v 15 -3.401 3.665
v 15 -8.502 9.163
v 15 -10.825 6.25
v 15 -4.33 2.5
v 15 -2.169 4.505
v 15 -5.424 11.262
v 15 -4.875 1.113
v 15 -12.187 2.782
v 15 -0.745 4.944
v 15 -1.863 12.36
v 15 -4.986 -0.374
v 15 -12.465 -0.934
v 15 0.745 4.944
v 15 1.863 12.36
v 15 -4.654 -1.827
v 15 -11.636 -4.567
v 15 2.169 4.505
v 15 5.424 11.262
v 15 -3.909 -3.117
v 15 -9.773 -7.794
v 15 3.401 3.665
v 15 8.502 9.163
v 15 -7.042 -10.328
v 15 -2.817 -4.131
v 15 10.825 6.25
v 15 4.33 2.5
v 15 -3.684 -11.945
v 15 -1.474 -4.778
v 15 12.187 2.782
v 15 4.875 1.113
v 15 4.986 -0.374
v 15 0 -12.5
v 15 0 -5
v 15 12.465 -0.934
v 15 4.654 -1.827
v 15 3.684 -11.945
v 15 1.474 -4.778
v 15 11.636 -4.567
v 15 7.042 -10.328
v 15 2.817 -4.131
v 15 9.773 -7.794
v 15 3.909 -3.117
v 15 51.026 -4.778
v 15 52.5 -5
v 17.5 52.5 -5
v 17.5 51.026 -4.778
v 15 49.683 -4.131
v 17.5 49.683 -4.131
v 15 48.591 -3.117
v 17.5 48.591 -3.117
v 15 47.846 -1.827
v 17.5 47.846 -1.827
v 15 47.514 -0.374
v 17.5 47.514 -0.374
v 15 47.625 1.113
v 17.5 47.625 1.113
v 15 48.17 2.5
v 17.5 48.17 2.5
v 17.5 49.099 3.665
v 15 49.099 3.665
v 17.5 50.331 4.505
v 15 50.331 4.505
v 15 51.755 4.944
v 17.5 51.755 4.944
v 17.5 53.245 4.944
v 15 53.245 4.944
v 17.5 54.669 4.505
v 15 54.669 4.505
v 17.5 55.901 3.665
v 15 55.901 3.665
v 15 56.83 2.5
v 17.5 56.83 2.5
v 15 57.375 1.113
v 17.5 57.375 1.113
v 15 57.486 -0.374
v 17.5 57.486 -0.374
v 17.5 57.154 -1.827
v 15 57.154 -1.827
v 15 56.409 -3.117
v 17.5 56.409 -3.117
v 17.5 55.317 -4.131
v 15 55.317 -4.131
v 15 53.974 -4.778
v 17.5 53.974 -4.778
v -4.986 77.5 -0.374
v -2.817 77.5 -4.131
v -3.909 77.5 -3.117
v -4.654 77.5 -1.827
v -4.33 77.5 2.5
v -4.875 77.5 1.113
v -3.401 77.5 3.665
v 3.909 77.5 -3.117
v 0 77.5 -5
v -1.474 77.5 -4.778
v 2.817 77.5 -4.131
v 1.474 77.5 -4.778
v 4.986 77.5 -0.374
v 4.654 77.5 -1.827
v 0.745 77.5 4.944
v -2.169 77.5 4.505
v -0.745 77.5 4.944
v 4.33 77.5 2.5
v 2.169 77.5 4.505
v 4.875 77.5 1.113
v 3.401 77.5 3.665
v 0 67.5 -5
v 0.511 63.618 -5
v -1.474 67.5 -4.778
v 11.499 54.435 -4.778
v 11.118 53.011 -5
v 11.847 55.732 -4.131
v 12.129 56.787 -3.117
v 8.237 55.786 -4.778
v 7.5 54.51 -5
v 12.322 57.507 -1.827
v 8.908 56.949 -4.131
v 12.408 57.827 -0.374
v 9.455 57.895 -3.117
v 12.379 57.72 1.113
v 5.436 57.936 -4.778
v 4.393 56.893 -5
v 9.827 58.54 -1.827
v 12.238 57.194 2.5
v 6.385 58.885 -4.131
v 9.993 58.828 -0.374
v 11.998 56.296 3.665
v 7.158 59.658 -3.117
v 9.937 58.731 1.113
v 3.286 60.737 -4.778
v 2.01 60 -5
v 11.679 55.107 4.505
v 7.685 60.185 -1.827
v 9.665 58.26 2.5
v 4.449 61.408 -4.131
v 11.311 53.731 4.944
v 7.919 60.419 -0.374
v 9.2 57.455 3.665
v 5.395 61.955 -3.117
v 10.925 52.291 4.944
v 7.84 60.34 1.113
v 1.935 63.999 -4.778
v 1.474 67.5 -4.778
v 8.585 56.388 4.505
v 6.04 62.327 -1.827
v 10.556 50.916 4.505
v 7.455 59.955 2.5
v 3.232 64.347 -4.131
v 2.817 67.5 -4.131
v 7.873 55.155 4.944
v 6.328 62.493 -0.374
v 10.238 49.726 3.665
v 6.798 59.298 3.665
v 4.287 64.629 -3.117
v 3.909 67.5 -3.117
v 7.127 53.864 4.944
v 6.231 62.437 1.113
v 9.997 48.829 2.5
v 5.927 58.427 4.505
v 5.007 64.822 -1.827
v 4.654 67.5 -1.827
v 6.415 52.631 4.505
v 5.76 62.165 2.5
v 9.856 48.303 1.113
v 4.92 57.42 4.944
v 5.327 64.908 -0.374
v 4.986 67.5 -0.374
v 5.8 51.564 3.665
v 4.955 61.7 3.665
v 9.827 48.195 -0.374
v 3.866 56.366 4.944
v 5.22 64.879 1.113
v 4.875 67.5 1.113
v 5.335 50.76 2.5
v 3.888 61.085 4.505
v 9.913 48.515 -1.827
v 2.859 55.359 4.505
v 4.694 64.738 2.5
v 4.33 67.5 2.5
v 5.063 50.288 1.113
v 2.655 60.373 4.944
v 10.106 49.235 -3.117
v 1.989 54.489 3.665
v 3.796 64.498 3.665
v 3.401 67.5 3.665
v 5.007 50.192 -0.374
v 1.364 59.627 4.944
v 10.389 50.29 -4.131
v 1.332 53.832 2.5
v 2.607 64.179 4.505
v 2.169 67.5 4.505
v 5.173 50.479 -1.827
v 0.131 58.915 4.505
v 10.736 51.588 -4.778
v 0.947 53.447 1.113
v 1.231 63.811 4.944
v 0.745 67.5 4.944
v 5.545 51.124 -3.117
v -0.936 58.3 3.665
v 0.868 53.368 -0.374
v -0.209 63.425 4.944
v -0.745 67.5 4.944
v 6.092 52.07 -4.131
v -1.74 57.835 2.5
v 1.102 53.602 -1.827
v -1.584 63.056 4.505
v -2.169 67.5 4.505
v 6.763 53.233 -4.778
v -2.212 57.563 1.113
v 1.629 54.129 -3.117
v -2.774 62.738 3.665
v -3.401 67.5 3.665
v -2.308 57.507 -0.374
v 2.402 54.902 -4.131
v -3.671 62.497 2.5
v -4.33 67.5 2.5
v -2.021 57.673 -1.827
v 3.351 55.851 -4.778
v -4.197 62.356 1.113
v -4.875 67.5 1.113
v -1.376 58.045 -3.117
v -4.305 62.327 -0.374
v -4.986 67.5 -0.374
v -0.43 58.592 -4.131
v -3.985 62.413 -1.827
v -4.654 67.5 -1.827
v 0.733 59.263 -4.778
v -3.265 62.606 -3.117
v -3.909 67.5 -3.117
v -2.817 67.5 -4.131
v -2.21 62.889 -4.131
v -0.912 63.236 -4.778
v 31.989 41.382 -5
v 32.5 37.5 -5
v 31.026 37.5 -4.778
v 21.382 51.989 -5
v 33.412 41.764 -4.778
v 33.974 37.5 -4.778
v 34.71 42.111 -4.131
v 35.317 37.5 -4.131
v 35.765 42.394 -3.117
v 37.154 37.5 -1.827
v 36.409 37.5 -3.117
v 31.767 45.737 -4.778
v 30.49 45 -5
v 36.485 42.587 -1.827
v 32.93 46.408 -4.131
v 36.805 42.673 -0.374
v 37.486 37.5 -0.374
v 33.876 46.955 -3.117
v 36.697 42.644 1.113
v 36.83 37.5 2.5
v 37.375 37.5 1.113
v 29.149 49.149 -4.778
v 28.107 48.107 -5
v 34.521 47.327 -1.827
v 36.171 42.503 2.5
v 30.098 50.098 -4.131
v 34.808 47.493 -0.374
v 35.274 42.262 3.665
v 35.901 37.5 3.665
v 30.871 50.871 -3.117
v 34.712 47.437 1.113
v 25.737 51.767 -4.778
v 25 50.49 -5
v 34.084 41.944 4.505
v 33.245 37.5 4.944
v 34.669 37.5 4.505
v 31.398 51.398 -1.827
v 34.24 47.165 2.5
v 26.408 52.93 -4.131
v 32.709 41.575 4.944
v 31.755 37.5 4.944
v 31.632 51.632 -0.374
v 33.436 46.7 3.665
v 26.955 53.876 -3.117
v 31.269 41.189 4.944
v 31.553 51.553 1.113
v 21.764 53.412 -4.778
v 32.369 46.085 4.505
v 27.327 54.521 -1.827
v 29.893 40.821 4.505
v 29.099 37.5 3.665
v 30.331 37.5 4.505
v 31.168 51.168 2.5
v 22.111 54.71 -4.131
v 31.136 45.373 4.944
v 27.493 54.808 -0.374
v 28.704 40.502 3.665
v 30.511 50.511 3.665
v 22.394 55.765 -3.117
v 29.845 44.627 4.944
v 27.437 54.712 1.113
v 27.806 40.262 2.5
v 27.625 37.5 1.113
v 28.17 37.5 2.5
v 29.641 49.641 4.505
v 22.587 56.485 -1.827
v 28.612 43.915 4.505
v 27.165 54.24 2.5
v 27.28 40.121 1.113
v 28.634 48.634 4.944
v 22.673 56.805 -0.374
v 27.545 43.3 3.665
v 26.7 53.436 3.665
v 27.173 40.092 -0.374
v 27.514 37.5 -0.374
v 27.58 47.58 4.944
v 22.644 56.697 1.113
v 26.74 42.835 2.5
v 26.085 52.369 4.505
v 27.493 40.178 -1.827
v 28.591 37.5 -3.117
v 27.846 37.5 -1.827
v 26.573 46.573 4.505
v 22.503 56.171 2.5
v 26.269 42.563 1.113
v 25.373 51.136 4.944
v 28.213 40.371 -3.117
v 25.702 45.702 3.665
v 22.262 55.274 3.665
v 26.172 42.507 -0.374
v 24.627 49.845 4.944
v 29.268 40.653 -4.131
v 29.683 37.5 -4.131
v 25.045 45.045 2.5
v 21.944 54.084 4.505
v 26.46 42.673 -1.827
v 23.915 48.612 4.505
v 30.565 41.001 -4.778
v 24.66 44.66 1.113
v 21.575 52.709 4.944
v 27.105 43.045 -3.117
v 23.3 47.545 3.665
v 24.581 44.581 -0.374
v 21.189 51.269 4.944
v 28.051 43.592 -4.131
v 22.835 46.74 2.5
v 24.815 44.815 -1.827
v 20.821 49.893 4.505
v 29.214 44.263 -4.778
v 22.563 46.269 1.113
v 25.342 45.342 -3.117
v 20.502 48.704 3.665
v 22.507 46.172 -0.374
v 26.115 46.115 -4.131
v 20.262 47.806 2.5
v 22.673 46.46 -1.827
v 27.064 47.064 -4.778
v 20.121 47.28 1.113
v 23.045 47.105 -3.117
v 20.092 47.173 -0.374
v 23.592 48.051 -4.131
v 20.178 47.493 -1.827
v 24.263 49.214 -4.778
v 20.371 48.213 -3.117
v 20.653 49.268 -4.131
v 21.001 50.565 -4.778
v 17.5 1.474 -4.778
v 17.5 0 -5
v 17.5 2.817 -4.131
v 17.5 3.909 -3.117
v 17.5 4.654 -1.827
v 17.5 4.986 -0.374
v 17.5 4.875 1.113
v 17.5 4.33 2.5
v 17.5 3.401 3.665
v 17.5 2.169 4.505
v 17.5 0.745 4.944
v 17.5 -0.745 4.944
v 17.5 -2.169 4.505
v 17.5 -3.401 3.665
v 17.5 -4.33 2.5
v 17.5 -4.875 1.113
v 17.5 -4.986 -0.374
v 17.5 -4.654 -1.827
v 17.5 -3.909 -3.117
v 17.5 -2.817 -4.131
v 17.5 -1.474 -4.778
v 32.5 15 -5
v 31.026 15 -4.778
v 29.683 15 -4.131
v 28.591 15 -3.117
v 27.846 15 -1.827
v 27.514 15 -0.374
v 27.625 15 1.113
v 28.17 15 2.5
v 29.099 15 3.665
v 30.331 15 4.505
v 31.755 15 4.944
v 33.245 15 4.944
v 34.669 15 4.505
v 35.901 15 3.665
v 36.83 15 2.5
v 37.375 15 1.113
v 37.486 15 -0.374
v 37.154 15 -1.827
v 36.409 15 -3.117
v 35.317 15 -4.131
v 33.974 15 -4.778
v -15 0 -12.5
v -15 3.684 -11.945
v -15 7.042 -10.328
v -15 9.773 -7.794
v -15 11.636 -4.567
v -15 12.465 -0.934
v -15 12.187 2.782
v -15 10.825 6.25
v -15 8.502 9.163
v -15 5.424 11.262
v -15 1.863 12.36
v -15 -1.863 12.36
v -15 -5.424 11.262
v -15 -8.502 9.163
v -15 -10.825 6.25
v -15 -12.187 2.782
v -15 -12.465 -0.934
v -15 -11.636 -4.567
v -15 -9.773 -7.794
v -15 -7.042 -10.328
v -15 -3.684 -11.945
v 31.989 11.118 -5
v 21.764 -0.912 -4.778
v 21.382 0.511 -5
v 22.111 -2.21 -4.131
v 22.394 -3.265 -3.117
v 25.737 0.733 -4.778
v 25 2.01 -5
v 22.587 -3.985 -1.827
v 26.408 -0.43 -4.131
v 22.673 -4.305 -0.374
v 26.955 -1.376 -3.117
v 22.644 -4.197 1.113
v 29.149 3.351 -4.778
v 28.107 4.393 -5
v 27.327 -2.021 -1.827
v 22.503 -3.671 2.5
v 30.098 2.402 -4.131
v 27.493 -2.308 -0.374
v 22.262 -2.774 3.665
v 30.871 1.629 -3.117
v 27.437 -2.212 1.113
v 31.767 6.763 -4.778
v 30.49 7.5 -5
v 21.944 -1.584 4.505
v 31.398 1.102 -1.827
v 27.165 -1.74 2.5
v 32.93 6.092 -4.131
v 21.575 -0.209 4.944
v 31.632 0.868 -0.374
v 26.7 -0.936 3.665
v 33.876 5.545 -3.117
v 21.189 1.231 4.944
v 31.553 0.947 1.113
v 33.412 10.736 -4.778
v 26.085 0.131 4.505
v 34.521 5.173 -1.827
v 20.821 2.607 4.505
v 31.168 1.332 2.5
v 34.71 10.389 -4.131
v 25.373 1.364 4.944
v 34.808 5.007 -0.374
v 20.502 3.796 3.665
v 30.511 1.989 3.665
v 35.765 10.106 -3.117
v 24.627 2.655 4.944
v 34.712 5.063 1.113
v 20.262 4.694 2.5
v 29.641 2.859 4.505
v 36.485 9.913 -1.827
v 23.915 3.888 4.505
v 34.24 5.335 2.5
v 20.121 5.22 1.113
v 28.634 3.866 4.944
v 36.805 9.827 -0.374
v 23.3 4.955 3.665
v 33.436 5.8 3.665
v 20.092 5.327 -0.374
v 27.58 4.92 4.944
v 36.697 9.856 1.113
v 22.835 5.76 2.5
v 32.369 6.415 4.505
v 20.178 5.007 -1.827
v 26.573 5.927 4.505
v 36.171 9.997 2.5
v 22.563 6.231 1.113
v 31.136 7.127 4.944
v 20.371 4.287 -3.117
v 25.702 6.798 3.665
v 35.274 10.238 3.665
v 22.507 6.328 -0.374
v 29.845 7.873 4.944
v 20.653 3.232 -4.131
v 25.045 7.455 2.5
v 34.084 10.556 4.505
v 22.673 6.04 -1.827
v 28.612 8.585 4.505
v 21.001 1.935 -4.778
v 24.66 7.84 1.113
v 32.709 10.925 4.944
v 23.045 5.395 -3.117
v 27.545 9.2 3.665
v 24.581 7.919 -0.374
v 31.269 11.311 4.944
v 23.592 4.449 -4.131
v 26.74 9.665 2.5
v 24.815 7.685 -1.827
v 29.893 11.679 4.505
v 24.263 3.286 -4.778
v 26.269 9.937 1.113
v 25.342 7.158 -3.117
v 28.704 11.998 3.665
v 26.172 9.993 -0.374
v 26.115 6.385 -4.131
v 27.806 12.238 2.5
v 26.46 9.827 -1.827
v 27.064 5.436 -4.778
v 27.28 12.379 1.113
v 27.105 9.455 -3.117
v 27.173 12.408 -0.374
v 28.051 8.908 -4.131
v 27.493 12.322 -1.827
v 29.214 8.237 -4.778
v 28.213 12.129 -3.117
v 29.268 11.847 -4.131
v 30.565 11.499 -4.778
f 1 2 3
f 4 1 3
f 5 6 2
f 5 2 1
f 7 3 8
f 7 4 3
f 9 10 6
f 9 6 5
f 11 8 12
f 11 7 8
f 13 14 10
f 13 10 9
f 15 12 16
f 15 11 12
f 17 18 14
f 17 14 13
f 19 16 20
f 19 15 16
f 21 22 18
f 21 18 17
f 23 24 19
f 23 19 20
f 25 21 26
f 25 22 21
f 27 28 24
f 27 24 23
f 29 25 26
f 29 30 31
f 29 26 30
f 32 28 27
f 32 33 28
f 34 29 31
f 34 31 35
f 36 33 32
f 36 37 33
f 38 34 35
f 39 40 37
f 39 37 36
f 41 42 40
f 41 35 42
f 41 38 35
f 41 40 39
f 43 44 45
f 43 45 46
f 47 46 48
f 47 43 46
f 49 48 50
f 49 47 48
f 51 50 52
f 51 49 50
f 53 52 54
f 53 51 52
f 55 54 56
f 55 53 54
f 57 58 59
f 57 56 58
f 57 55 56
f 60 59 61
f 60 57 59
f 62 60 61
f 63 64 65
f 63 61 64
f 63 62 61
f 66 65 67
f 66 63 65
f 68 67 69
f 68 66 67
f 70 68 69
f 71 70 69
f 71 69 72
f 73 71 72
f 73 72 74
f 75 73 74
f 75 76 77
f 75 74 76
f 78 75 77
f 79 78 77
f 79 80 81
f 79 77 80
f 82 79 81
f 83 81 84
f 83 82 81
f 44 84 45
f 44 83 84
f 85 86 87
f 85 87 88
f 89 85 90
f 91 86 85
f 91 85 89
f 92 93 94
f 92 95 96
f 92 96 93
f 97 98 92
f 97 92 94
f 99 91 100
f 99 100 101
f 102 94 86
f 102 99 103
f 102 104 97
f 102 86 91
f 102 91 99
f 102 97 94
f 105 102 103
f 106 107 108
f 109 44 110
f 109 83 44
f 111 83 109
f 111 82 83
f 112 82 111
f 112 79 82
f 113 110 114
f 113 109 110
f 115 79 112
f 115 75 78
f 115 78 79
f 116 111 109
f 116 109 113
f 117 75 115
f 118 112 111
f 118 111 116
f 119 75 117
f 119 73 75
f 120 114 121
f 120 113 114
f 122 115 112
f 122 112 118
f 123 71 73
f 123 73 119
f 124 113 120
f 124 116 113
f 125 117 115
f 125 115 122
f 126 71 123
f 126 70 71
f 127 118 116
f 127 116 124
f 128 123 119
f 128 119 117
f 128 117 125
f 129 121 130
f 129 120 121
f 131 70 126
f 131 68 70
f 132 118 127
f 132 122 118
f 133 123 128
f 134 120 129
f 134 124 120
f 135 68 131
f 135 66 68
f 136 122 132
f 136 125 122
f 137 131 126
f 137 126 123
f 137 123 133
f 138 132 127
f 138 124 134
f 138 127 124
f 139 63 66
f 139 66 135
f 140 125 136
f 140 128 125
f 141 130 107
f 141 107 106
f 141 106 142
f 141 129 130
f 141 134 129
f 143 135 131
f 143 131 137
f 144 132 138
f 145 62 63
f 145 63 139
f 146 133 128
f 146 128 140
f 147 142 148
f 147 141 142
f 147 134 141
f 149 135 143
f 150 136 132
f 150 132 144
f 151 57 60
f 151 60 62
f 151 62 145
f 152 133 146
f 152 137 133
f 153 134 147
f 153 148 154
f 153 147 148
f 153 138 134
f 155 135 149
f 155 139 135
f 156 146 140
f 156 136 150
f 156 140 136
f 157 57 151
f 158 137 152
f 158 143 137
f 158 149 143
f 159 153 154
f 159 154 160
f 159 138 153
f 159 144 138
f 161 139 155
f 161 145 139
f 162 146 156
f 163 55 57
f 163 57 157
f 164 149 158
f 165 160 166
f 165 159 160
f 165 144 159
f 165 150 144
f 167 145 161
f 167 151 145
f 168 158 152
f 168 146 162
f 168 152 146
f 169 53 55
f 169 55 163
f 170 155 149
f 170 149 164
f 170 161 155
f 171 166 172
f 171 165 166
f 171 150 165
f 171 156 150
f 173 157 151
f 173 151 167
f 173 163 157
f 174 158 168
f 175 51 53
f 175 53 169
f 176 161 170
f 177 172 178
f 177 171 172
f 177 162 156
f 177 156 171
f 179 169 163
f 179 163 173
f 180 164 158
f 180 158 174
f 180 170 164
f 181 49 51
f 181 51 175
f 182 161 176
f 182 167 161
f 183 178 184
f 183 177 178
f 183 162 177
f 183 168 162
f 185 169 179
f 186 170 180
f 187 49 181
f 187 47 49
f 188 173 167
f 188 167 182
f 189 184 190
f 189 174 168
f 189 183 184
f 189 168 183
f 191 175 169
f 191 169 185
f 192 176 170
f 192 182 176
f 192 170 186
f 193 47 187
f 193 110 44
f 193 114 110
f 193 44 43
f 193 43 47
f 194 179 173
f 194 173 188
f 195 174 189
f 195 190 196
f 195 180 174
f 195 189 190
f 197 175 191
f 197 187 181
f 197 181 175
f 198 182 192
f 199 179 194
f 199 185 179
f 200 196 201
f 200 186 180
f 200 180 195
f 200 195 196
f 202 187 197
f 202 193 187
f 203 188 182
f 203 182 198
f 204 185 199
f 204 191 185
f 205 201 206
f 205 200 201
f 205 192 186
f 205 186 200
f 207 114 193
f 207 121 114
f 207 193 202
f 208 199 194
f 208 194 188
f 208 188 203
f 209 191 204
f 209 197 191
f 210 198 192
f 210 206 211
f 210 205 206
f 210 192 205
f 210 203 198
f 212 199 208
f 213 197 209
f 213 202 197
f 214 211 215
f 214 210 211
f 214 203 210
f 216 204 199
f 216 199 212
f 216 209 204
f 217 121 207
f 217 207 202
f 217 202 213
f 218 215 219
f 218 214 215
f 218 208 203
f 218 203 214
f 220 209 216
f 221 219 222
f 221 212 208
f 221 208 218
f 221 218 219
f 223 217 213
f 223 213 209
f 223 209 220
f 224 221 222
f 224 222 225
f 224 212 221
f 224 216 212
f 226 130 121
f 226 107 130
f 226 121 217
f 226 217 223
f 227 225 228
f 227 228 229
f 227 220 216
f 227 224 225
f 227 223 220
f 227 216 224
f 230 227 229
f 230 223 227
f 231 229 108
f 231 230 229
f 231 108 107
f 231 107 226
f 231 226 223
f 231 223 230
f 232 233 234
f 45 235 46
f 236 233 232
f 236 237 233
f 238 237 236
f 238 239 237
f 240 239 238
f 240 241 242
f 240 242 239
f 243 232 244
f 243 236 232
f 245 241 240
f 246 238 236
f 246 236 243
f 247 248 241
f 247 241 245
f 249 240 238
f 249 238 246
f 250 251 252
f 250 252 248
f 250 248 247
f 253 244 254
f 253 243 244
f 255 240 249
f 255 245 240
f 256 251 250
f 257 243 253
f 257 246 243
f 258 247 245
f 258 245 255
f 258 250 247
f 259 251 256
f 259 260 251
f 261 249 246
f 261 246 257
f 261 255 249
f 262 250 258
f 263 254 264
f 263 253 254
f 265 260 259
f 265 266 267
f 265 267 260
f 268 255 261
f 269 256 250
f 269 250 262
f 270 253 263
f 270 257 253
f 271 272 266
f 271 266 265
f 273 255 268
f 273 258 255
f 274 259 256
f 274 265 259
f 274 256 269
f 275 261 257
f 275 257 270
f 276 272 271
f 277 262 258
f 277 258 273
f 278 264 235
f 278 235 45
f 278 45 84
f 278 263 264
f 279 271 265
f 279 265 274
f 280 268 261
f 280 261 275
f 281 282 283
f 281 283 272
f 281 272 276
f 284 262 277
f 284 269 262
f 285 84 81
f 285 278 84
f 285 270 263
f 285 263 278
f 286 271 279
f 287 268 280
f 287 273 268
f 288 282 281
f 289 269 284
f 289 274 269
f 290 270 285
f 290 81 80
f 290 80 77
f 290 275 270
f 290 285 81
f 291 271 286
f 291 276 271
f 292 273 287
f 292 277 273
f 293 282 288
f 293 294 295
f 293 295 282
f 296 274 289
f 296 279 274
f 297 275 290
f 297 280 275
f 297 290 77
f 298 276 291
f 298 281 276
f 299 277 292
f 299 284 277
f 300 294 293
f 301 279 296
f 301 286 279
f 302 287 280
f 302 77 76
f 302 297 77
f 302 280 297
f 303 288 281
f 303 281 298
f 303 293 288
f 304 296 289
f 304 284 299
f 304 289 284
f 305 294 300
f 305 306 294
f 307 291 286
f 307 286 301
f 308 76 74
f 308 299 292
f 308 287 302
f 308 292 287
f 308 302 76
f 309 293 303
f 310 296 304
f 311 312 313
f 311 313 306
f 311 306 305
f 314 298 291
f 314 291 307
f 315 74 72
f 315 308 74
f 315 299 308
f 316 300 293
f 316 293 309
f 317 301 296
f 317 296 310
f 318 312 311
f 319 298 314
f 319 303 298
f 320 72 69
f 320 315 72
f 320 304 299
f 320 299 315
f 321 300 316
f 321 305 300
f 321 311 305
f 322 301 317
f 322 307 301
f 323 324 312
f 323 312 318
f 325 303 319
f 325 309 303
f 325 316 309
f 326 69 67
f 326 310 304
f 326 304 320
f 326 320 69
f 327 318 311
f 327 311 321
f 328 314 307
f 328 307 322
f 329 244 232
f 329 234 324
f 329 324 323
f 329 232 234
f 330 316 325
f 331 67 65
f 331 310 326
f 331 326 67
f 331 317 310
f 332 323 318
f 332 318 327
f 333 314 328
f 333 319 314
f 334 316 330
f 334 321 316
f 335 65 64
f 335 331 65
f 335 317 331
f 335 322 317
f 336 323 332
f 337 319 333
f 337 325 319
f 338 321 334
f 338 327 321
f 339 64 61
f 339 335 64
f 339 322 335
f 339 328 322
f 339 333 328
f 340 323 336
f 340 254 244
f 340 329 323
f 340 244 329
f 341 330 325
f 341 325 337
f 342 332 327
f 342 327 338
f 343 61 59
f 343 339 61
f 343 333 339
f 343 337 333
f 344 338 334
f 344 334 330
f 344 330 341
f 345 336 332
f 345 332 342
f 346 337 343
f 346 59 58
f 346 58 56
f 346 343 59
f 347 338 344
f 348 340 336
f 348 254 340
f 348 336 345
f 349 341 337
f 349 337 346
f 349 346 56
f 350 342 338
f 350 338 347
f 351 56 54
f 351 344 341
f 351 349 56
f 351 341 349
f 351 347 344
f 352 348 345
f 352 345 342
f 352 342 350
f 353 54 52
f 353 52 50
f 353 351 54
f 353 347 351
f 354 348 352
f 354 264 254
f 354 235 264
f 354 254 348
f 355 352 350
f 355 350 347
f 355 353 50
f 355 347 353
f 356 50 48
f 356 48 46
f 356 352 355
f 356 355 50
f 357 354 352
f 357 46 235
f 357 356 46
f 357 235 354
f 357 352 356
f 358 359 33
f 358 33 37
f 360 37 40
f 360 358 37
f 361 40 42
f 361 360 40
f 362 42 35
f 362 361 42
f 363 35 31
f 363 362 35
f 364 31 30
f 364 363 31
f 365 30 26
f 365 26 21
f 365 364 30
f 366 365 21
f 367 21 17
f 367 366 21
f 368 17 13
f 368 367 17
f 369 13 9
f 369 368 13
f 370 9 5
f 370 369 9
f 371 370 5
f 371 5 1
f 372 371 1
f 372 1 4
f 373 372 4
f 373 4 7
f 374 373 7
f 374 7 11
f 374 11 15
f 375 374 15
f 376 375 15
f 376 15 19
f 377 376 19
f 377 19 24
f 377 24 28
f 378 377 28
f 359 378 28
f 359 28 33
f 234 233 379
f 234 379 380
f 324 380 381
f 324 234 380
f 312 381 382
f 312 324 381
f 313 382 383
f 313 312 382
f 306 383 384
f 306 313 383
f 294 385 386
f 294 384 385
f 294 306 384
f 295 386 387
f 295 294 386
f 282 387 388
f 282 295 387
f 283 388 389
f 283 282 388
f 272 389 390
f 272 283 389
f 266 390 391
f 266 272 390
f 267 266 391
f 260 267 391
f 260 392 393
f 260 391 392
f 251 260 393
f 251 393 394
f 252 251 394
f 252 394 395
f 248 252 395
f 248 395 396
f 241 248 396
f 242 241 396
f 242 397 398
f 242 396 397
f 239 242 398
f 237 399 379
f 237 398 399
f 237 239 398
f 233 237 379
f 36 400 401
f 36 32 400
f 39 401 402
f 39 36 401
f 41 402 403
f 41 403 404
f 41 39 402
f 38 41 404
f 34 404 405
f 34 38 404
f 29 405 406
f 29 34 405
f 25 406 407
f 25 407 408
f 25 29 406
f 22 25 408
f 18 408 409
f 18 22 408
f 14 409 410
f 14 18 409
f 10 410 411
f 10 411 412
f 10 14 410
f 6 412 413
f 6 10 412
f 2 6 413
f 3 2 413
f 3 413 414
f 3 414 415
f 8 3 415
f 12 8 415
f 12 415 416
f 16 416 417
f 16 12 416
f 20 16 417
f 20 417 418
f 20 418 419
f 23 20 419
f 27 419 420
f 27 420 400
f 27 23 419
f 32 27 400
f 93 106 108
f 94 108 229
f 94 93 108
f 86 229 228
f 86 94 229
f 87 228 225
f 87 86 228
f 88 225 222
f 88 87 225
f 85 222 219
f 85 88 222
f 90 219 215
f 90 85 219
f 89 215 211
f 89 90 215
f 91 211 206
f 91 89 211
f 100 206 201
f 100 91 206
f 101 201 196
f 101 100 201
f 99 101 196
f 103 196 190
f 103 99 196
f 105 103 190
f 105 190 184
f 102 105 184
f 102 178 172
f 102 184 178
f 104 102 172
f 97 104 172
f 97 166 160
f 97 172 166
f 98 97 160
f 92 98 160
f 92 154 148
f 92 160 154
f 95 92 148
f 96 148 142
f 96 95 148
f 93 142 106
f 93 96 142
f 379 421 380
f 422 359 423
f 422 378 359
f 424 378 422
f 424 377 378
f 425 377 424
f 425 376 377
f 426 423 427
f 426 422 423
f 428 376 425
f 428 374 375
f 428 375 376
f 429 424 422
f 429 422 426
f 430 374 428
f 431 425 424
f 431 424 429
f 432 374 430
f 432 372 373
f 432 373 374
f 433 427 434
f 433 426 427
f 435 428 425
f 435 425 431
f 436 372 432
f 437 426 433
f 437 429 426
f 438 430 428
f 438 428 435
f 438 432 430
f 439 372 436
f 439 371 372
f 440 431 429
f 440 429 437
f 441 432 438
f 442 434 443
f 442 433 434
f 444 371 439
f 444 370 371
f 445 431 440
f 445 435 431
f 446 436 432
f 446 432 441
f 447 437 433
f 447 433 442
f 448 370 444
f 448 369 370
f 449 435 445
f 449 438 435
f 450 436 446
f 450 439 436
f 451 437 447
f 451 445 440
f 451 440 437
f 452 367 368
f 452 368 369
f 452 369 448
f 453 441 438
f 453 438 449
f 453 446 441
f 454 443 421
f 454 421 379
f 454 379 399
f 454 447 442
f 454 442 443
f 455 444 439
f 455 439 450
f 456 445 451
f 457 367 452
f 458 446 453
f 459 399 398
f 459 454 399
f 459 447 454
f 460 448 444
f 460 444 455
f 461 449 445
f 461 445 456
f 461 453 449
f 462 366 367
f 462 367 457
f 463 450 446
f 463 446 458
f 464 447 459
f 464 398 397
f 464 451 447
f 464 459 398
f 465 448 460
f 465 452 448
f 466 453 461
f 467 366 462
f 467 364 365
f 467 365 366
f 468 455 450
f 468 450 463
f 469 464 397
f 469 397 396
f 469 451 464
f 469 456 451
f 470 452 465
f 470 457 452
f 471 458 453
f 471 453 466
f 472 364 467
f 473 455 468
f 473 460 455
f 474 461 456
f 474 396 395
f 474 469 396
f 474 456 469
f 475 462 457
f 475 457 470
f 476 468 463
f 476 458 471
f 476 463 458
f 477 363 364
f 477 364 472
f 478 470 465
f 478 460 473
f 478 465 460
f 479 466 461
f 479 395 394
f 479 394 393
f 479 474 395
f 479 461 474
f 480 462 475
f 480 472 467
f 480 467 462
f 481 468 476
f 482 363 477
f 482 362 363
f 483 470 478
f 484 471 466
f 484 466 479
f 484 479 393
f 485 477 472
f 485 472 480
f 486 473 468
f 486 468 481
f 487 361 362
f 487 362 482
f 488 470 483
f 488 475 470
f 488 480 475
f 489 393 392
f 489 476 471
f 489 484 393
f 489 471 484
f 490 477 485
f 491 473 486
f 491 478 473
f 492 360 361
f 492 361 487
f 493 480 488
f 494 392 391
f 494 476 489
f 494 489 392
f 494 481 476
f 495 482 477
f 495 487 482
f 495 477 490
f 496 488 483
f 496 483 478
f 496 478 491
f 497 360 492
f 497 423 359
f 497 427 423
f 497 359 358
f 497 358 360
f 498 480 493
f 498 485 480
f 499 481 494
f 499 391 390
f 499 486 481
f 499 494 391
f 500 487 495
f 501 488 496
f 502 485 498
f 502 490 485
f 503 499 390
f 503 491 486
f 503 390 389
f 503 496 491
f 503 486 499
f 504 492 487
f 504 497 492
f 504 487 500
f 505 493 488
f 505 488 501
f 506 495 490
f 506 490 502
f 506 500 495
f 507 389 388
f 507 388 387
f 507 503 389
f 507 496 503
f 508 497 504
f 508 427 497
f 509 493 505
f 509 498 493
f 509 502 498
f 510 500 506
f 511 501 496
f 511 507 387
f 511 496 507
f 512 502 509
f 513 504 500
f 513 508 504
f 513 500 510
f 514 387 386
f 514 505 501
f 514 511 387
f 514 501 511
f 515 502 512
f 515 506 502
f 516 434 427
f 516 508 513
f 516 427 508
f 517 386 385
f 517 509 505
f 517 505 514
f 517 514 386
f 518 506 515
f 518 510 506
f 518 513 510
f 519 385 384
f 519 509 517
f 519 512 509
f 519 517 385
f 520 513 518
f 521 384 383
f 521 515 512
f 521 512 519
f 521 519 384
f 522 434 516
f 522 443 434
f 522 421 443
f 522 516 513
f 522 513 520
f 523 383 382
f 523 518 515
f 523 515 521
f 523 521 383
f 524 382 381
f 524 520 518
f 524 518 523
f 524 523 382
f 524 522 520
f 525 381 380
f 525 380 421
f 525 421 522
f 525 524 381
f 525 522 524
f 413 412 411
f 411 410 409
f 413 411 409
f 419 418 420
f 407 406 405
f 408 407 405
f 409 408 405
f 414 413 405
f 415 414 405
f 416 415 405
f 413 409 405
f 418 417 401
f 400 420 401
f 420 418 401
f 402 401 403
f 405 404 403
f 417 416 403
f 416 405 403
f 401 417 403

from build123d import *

# Parameters (mm, degrees)
SKETCH1_R           = 12.5
BOSS_EXTRUDE1_DEPTH = 15
SKETCH8_R           = 5


with BuildPart() as part:
    # Sketch1 → Boss-Extrude1 (new, symmetric)
    with BuildSketch(Plane(origin=(0, 0, 0), x_dir=(0, 0, -1), z_dir=(1, 0, 0))):
        Circle(SKETCH1_R)
    extrude(amount=BOSS_EXTRUDE1_DEPTH, both=True)

    # Sweep1: sweep along a path in Sketch7
    with BuildLine(Plane.XY) as sweep1_path:
        Line((15, 0), (17.5, 0))
        ThreePointArc((17.5, 0), (28.106601718, 4.393398282), (32.5, 15))
        Line((32.5, 15), (32.5, 37.5))
        ThreePointArc((32.5, 37.5), (28.106601718, 48.106601718), (17.5, 52.5))
        Line((17.5, 52.5), (15, 52.5))
        ThreePointArc((15, 52.5), (4.393398282, 56.893398282), (0, 67.5))
        Line((0, 67.5), (0, 77.5))
    # Sketch8 → Sweep1 (sweep)
    with BuildSketch(Plane(origin=(15, 0, 0), x_dir=(0, 0, -1), z_dir=(1, 0, 0))):
        Circle(SKETCH8_R)
    sweep(path=sweep1_path.line)


solid = part.part
